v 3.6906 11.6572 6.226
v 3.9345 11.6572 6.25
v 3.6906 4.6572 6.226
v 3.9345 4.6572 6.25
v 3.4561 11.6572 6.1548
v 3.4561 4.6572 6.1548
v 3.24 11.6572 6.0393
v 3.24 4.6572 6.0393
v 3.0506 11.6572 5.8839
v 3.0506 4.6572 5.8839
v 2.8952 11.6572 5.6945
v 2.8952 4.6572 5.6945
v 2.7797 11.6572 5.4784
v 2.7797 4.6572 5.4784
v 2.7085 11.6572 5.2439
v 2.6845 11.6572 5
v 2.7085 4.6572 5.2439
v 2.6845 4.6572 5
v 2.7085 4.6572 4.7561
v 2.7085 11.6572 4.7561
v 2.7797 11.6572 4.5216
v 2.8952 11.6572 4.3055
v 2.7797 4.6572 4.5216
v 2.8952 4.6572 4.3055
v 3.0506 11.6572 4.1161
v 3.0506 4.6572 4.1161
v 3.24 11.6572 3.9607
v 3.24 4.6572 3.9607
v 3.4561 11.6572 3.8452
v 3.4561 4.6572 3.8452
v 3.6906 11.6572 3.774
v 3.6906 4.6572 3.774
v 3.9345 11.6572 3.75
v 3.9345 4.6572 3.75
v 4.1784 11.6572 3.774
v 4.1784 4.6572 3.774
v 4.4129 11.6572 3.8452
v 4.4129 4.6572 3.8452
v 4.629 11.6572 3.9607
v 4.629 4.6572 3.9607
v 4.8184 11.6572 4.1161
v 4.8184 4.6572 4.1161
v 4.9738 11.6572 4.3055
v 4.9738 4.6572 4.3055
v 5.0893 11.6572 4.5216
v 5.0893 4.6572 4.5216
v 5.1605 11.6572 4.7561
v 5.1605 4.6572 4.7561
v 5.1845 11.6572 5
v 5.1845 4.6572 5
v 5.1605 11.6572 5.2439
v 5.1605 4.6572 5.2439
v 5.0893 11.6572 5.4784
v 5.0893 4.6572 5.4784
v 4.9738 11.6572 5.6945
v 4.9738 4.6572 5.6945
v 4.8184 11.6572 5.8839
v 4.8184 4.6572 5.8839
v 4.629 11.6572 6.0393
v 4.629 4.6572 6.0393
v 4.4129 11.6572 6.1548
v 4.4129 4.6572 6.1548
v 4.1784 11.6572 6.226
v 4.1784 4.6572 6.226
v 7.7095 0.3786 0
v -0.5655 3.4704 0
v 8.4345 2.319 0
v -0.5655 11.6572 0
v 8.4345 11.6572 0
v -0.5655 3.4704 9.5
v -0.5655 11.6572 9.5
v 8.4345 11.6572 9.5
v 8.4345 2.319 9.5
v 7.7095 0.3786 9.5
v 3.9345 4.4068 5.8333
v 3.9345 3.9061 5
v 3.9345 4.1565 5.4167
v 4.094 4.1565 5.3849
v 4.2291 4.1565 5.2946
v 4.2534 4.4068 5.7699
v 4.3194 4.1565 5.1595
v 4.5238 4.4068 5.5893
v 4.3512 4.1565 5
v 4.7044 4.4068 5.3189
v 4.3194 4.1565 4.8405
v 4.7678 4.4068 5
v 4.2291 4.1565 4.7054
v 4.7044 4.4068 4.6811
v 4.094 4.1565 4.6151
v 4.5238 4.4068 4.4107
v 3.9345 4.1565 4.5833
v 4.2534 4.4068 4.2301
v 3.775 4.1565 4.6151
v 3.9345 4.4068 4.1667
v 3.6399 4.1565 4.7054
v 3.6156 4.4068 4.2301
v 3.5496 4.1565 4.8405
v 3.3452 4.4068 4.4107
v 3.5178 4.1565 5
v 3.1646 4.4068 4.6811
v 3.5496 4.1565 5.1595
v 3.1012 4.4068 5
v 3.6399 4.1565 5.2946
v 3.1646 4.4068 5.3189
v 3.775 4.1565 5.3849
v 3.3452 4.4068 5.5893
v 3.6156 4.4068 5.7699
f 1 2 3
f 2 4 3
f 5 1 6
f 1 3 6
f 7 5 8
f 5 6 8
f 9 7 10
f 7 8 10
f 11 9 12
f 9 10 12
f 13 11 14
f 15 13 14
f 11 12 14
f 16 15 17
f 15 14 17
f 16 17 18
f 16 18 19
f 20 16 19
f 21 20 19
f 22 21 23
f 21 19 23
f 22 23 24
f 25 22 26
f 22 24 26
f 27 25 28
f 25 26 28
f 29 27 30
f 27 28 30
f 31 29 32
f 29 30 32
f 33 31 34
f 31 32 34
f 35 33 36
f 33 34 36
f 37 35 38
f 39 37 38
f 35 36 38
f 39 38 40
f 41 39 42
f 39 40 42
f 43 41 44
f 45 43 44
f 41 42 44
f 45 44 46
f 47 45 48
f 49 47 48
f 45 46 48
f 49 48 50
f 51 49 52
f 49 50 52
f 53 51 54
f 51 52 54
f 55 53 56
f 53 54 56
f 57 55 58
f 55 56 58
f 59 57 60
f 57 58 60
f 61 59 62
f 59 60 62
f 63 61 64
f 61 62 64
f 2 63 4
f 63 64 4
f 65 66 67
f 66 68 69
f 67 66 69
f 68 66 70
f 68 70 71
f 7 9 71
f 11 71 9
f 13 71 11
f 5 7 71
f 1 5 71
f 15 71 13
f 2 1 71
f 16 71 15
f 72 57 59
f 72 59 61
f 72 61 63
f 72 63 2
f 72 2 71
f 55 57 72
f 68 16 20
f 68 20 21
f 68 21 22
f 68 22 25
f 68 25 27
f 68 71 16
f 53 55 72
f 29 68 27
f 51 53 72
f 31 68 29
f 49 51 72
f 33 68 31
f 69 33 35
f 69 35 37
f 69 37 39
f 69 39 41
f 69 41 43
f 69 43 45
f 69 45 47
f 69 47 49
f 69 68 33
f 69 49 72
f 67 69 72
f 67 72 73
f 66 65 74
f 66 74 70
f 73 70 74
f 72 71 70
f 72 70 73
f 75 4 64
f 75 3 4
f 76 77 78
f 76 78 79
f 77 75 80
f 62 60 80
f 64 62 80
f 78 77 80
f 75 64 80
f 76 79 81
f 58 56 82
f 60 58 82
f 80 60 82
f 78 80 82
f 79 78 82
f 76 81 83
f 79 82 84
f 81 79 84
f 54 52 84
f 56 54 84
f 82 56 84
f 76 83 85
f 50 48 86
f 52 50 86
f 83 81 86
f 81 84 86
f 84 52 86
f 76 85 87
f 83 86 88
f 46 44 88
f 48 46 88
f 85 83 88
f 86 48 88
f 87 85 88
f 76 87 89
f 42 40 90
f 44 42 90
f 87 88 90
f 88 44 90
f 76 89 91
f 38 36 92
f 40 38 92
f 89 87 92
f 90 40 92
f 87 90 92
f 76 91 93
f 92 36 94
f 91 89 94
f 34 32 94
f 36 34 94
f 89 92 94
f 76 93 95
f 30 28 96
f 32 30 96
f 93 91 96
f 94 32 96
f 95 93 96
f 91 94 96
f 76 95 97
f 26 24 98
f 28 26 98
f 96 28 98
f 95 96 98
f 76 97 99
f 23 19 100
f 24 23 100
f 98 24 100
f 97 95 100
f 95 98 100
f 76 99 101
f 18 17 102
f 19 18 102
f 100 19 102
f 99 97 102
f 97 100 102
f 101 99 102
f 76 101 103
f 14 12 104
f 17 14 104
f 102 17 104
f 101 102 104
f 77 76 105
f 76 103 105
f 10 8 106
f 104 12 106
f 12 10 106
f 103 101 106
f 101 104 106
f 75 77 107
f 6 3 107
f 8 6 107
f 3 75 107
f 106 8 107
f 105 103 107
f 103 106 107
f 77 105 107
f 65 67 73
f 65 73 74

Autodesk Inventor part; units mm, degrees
ref_plane "YZ Plane" through (0, 0, 0) normal (1, 0, 0) x (0, 1, 0)
ref_plane "XZ Plane" through (0, 0, 0) normal (0, 1, 0) x (-1, 0, 0)
ref_plane "XY Plane" through (0, 0, 0) normal (0, 0, 1) x (1, 0, 0)
sketch "Sketch2" plane through (0, 0, 0) normal (0, 0, 1) x (1, 0, 0)
  line L0 (-5.0655, 3.6572) -> (12.9345, 3.6572)
  line L1 (12.9345, 3.6572) -> (12.9345, -8.3428)
  line L2 (12.9345, -8.3428) -> (-5.0655, -8.3428)
  line L3 (-5.0655, -8.3428) -> (-5.0655, 3.6572)
  line L4 (8.9345, 3.6572) -> (7.7095, 0.3786)
  line L5 (7.7095, 0.3786) -> (-1.0655, 3.6572)
  line L6 (-1.0655, 3.6572) -> (-1.0655, 11.6572)
  line L7 (-1.0655, 11.6572) -> (8.9345, 11.6572)
  line L8 (8.9345, 11.6572) -> (8.9345, 3.6572)
  point P0 (0, 0)
  dimension "d0" = 18
  dimension "d1" = 12
  dimension "d2" = 3.5
  dimension "d3" = 4
  dimension "d4" = 4
  dimension "d5" = 110.487
  dimension "d6" = 8
extrude "Extrusion1" add sketch "Sketch2" along normal blind 9.5 contours L6 L7 L8 L0 | L0 L4 L5
sketch "Sketch3" plane through (0, 0, 9.5) normal (0, 0, 1) x (1, 0, 0)
  line L0 (-1.0655, 3.6572) -> (7.7095, 0.3786) projected
  line L1 (7.7095, 0.3786) -> (8.9345, 3.6572) projected
  line L2 (8.9345, 3.6572) -> (8.9345, 11.6572) projected
  line L3 (8.9345, 11.6572) -> (-1.0655, 11.6572) projected
  line L4 (-1.0655, 11.6572) -> (-1.0655, 3.6572) projected
  line L5 (-0.5655, 15.4431) -> (8.4345, 15.4431)
  line L6 (8.4345, 15.4431) -> (8.4345, -6.1671)
  line L7 (8.4345, -6.1671) -> (-0.5655, -6.1671)
  line L8 (-0.5655, -6.1671) -> (-0.5655, 15.4431)
  point P0 (0, 0)
  dimension "d9" = 0.5
  dimension "d10" = 0.5
extrude "Extrusion2" cut sketch "Sketch3" against normal blind 10 contours L8 L3 L6 L1 L0 | L0 L1 L6 L7 L8 | L8 L5 L6 L3 keep common part
sketch "Sketch4" plane through (-0.5655, 11.6572, 9.5) normal (0, 1, 0) x (1, 0, 0)
  line L0 (0, 0) -> (0, 9.5) projected
  line L1 (9, 0) -> (0, 0) projected
  line L2 (9, 9.5) -> (9, 0) projected
  line L3 (9, 9.5) -> (0, 9.5) projected
  point P0 (0.5655, 9.5)
  point P1 (4.5, 4.5)
  dimension "d13" = 4.5
  dimension "d14" = 4.5
  dimension "d15" = 9
  dimension "d16" = 9.5
hole "Hole1" at (3.9345, 11.6572, 5) direction (0, -1, 0) diameter 2.5 depth 7 tip angle 118
equation "\"d14\" = 0.5 * d15"
properties part number "3DP_PLA_Measurement_Rail_Rammer"
